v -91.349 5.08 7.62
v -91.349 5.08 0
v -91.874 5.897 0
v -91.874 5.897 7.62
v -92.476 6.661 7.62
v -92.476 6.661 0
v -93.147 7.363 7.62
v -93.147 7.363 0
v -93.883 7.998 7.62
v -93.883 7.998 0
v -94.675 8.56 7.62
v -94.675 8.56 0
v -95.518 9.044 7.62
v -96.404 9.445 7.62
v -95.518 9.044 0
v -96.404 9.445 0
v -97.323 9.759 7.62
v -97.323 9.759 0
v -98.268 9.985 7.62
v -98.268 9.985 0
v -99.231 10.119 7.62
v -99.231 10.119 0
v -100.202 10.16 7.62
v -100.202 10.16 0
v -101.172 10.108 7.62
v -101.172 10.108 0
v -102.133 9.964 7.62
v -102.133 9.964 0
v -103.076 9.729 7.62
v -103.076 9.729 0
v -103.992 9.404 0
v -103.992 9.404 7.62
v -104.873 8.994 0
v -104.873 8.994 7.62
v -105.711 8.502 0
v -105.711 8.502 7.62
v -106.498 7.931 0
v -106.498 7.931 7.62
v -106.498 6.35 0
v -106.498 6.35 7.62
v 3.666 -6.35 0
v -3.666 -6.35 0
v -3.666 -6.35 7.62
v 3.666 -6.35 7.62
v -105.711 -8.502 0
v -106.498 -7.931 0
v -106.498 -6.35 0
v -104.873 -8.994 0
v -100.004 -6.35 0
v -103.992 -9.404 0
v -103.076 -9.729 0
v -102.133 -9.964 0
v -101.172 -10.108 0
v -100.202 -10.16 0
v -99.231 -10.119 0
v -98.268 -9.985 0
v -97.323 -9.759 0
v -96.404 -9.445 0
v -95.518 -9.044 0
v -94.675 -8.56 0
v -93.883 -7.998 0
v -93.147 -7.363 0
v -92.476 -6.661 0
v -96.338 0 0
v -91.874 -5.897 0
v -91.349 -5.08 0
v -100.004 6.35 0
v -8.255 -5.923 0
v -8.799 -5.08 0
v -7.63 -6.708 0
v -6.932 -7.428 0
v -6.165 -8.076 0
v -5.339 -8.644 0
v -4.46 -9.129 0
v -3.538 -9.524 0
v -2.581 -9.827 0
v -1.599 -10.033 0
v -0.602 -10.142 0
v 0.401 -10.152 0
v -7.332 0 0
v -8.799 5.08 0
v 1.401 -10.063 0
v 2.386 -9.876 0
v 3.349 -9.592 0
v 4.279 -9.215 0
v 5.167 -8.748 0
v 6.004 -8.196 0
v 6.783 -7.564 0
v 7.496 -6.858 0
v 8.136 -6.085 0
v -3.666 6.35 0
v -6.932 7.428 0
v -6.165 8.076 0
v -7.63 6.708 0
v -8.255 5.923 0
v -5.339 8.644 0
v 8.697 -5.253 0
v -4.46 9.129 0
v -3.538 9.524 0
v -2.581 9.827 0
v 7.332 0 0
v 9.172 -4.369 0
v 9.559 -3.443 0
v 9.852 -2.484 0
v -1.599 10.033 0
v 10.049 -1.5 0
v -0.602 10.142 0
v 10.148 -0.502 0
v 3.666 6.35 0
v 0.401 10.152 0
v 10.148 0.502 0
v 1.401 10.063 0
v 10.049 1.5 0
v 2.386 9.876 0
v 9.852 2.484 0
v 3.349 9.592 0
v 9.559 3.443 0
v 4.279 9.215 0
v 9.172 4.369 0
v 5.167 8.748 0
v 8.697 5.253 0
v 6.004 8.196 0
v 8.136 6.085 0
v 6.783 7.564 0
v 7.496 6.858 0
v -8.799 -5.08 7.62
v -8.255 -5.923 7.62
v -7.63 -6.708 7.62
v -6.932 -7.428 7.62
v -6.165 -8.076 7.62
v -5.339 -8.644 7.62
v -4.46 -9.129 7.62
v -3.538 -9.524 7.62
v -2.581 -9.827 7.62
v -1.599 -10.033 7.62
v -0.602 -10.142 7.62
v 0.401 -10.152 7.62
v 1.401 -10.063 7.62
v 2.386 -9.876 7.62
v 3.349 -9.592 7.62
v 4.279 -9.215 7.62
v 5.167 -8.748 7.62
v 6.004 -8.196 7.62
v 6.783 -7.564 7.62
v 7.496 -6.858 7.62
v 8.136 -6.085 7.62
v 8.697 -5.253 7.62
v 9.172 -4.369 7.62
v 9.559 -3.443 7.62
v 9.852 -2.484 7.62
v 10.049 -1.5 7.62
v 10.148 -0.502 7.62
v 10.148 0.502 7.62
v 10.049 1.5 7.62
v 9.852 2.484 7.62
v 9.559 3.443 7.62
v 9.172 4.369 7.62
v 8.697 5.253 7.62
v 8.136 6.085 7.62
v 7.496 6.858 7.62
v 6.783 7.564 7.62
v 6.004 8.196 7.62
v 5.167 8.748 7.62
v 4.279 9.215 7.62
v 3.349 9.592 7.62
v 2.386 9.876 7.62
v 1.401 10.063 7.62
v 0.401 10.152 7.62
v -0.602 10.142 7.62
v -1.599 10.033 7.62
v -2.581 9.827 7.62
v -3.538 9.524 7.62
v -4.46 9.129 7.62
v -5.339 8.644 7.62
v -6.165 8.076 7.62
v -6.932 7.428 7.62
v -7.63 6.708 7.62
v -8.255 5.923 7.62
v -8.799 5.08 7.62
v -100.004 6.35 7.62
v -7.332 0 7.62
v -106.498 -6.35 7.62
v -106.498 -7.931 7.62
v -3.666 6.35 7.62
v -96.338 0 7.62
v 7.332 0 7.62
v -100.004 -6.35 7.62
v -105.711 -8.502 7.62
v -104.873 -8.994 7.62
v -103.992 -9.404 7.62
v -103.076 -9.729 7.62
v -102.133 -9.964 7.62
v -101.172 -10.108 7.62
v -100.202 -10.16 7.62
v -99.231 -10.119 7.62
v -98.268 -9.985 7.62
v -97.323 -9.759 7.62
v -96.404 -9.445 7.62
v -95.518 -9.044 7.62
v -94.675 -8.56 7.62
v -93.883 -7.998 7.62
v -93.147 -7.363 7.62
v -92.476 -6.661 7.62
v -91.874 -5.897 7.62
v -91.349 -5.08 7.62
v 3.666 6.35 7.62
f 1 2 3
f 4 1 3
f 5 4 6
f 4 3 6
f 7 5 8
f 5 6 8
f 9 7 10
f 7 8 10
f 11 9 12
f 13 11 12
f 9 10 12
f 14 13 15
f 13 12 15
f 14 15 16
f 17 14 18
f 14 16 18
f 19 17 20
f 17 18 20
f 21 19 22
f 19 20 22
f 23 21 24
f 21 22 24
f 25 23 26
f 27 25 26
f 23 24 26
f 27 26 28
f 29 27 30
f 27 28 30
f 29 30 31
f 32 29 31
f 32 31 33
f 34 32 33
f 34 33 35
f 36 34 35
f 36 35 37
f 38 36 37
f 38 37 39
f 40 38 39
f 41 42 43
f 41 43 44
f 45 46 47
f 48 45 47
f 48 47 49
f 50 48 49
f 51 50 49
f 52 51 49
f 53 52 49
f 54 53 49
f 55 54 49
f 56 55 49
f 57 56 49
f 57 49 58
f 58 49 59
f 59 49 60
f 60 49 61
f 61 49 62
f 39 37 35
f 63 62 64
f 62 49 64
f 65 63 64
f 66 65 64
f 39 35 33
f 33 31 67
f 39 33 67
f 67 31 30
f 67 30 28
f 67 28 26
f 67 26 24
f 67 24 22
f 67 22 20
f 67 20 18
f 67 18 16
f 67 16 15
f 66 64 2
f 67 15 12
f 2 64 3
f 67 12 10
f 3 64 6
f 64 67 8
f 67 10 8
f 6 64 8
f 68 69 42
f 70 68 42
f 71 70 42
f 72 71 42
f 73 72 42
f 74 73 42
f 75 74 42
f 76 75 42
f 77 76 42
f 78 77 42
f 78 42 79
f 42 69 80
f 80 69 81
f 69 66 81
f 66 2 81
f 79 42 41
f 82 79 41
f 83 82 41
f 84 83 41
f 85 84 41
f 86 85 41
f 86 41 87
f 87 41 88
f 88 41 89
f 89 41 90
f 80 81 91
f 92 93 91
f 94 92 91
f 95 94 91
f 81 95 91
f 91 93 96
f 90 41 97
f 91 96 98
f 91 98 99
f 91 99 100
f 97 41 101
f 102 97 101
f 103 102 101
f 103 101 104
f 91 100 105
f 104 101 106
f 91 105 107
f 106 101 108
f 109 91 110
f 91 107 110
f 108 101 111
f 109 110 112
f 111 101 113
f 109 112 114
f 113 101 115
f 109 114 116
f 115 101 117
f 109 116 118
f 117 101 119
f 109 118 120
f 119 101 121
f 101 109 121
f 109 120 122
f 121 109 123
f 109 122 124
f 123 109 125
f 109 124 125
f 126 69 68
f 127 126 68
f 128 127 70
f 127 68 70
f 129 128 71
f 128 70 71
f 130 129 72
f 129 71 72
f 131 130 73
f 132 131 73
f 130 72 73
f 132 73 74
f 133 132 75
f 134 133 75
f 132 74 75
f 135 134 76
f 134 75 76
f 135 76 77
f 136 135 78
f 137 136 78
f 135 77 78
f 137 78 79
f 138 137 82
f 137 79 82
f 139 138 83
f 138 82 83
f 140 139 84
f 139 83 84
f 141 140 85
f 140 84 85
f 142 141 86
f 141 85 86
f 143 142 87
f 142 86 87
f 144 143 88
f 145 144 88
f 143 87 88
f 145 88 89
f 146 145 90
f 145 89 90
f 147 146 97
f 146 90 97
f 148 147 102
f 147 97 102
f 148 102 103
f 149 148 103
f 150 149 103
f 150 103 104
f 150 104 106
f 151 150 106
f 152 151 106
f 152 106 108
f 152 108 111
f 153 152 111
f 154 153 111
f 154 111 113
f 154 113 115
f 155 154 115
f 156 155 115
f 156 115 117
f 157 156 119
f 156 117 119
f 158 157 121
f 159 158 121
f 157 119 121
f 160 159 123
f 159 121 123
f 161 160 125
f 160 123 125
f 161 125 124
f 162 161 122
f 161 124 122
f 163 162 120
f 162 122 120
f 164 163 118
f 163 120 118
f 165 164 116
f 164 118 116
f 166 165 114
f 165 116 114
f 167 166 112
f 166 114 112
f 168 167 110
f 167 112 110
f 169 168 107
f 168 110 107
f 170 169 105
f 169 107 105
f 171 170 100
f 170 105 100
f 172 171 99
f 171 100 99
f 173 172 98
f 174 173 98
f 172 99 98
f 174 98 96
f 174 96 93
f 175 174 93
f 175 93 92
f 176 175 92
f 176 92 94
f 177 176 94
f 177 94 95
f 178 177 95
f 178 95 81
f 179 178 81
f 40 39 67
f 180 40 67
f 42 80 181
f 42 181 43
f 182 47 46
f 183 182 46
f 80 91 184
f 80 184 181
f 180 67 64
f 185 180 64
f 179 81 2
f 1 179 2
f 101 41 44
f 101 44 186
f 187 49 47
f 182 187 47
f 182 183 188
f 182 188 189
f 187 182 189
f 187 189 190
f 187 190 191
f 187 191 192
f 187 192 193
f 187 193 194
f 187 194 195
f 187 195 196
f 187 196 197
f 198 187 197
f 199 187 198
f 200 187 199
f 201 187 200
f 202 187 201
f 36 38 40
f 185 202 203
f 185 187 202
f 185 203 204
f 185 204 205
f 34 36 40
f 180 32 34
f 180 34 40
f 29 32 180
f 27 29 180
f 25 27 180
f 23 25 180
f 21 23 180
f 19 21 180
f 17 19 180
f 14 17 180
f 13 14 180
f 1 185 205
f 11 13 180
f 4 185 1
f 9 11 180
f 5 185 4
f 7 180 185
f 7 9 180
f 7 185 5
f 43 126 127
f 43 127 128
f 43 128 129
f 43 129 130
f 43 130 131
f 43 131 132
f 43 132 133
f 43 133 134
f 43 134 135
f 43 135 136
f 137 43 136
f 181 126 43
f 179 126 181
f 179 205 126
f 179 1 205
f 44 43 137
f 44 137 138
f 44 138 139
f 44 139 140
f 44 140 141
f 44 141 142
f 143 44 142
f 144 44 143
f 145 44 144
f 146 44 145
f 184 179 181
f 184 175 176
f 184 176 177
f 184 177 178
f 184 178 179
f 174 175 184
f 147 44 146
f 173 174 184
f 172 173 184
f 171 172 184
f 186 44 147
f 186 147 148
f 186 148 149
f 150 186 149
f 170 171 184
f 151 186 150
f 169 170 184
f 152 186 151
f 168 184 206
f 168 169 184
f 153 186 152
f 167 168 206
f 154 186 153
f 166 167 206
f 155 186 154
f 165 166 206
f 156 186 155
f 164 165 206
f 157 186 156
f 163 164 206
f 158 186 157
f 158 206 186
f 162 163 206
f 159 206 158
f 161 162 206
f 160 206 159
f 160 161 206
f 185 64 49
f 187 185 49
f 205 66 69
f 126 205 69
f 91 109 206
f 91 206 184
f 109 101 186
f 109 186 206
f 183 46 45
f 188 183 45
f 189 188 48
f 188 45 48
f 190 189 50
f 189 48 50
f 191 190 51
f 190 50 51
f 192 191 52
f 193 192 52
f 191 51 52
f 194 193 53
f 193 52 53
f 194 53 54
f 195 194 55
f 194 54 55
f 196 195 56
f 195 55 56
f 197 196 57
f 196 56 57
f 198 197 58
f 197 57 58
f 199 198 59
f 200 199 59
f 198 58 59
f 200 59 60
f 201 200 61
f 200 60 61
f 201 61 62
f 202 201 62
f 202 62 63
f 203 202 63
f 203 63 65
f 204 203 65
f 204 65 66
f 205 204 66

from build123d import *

# Parameters (mm, degrees)
BOSS_EXTRUDE1_DEPTH = 7.62


with BuildPart() as part:
    # Sketch3 → Boss-Extrude1 (new body)
    with BuildSketch(Plane.XY):
        with BuildLine():
            Line((-8.798818102, 5.08), (-91.348818102, 5.08))
            ThreePointArc((-91.348818102, 5.08), (-98.268424141, 9.984696391), (-106.497636205, 7.931147458))
            Line((-106.497636205, 7.931147458), (-106.497636205, 6.35))
            Line((-106.497636205, 6.35), (-100.003810414, 6.35))
            Line((-100.003810414, 6.35), (-96.337636205, 0))
            Line((-96.337636205, 0), (-100.003810414, -6.35))
            Line((-100.003810414, -6.35), (-106.497636205, -6.35))
            Line((-106.497636205, -6.35), (-106.497636205, -7.931147458))
            ThreePointArc((-106.497636205, -7.931147458), (-98.268424141, -9.984696391), (-91.348818102, -5.08))
            Line((-91.348818102, -5.08), (-8.798818102, -5.08))
            ThreePointArc((-8.798818102, -5.08), (10.16, 0), (-8.798818102, 5.08))
        make_face()
        Polygon((7.332348419, 0), (3.666174209, 6.35), (-3.666174209, 6.35), (-7.332348419, 0), (-3.666174209, -6.35), (3.666174209, -6.35), align=None, mode=Mode.SUBTRACT)
    extrude(amount=BOSS_EXTRUDE1_DEPTH)


solid = part.part
